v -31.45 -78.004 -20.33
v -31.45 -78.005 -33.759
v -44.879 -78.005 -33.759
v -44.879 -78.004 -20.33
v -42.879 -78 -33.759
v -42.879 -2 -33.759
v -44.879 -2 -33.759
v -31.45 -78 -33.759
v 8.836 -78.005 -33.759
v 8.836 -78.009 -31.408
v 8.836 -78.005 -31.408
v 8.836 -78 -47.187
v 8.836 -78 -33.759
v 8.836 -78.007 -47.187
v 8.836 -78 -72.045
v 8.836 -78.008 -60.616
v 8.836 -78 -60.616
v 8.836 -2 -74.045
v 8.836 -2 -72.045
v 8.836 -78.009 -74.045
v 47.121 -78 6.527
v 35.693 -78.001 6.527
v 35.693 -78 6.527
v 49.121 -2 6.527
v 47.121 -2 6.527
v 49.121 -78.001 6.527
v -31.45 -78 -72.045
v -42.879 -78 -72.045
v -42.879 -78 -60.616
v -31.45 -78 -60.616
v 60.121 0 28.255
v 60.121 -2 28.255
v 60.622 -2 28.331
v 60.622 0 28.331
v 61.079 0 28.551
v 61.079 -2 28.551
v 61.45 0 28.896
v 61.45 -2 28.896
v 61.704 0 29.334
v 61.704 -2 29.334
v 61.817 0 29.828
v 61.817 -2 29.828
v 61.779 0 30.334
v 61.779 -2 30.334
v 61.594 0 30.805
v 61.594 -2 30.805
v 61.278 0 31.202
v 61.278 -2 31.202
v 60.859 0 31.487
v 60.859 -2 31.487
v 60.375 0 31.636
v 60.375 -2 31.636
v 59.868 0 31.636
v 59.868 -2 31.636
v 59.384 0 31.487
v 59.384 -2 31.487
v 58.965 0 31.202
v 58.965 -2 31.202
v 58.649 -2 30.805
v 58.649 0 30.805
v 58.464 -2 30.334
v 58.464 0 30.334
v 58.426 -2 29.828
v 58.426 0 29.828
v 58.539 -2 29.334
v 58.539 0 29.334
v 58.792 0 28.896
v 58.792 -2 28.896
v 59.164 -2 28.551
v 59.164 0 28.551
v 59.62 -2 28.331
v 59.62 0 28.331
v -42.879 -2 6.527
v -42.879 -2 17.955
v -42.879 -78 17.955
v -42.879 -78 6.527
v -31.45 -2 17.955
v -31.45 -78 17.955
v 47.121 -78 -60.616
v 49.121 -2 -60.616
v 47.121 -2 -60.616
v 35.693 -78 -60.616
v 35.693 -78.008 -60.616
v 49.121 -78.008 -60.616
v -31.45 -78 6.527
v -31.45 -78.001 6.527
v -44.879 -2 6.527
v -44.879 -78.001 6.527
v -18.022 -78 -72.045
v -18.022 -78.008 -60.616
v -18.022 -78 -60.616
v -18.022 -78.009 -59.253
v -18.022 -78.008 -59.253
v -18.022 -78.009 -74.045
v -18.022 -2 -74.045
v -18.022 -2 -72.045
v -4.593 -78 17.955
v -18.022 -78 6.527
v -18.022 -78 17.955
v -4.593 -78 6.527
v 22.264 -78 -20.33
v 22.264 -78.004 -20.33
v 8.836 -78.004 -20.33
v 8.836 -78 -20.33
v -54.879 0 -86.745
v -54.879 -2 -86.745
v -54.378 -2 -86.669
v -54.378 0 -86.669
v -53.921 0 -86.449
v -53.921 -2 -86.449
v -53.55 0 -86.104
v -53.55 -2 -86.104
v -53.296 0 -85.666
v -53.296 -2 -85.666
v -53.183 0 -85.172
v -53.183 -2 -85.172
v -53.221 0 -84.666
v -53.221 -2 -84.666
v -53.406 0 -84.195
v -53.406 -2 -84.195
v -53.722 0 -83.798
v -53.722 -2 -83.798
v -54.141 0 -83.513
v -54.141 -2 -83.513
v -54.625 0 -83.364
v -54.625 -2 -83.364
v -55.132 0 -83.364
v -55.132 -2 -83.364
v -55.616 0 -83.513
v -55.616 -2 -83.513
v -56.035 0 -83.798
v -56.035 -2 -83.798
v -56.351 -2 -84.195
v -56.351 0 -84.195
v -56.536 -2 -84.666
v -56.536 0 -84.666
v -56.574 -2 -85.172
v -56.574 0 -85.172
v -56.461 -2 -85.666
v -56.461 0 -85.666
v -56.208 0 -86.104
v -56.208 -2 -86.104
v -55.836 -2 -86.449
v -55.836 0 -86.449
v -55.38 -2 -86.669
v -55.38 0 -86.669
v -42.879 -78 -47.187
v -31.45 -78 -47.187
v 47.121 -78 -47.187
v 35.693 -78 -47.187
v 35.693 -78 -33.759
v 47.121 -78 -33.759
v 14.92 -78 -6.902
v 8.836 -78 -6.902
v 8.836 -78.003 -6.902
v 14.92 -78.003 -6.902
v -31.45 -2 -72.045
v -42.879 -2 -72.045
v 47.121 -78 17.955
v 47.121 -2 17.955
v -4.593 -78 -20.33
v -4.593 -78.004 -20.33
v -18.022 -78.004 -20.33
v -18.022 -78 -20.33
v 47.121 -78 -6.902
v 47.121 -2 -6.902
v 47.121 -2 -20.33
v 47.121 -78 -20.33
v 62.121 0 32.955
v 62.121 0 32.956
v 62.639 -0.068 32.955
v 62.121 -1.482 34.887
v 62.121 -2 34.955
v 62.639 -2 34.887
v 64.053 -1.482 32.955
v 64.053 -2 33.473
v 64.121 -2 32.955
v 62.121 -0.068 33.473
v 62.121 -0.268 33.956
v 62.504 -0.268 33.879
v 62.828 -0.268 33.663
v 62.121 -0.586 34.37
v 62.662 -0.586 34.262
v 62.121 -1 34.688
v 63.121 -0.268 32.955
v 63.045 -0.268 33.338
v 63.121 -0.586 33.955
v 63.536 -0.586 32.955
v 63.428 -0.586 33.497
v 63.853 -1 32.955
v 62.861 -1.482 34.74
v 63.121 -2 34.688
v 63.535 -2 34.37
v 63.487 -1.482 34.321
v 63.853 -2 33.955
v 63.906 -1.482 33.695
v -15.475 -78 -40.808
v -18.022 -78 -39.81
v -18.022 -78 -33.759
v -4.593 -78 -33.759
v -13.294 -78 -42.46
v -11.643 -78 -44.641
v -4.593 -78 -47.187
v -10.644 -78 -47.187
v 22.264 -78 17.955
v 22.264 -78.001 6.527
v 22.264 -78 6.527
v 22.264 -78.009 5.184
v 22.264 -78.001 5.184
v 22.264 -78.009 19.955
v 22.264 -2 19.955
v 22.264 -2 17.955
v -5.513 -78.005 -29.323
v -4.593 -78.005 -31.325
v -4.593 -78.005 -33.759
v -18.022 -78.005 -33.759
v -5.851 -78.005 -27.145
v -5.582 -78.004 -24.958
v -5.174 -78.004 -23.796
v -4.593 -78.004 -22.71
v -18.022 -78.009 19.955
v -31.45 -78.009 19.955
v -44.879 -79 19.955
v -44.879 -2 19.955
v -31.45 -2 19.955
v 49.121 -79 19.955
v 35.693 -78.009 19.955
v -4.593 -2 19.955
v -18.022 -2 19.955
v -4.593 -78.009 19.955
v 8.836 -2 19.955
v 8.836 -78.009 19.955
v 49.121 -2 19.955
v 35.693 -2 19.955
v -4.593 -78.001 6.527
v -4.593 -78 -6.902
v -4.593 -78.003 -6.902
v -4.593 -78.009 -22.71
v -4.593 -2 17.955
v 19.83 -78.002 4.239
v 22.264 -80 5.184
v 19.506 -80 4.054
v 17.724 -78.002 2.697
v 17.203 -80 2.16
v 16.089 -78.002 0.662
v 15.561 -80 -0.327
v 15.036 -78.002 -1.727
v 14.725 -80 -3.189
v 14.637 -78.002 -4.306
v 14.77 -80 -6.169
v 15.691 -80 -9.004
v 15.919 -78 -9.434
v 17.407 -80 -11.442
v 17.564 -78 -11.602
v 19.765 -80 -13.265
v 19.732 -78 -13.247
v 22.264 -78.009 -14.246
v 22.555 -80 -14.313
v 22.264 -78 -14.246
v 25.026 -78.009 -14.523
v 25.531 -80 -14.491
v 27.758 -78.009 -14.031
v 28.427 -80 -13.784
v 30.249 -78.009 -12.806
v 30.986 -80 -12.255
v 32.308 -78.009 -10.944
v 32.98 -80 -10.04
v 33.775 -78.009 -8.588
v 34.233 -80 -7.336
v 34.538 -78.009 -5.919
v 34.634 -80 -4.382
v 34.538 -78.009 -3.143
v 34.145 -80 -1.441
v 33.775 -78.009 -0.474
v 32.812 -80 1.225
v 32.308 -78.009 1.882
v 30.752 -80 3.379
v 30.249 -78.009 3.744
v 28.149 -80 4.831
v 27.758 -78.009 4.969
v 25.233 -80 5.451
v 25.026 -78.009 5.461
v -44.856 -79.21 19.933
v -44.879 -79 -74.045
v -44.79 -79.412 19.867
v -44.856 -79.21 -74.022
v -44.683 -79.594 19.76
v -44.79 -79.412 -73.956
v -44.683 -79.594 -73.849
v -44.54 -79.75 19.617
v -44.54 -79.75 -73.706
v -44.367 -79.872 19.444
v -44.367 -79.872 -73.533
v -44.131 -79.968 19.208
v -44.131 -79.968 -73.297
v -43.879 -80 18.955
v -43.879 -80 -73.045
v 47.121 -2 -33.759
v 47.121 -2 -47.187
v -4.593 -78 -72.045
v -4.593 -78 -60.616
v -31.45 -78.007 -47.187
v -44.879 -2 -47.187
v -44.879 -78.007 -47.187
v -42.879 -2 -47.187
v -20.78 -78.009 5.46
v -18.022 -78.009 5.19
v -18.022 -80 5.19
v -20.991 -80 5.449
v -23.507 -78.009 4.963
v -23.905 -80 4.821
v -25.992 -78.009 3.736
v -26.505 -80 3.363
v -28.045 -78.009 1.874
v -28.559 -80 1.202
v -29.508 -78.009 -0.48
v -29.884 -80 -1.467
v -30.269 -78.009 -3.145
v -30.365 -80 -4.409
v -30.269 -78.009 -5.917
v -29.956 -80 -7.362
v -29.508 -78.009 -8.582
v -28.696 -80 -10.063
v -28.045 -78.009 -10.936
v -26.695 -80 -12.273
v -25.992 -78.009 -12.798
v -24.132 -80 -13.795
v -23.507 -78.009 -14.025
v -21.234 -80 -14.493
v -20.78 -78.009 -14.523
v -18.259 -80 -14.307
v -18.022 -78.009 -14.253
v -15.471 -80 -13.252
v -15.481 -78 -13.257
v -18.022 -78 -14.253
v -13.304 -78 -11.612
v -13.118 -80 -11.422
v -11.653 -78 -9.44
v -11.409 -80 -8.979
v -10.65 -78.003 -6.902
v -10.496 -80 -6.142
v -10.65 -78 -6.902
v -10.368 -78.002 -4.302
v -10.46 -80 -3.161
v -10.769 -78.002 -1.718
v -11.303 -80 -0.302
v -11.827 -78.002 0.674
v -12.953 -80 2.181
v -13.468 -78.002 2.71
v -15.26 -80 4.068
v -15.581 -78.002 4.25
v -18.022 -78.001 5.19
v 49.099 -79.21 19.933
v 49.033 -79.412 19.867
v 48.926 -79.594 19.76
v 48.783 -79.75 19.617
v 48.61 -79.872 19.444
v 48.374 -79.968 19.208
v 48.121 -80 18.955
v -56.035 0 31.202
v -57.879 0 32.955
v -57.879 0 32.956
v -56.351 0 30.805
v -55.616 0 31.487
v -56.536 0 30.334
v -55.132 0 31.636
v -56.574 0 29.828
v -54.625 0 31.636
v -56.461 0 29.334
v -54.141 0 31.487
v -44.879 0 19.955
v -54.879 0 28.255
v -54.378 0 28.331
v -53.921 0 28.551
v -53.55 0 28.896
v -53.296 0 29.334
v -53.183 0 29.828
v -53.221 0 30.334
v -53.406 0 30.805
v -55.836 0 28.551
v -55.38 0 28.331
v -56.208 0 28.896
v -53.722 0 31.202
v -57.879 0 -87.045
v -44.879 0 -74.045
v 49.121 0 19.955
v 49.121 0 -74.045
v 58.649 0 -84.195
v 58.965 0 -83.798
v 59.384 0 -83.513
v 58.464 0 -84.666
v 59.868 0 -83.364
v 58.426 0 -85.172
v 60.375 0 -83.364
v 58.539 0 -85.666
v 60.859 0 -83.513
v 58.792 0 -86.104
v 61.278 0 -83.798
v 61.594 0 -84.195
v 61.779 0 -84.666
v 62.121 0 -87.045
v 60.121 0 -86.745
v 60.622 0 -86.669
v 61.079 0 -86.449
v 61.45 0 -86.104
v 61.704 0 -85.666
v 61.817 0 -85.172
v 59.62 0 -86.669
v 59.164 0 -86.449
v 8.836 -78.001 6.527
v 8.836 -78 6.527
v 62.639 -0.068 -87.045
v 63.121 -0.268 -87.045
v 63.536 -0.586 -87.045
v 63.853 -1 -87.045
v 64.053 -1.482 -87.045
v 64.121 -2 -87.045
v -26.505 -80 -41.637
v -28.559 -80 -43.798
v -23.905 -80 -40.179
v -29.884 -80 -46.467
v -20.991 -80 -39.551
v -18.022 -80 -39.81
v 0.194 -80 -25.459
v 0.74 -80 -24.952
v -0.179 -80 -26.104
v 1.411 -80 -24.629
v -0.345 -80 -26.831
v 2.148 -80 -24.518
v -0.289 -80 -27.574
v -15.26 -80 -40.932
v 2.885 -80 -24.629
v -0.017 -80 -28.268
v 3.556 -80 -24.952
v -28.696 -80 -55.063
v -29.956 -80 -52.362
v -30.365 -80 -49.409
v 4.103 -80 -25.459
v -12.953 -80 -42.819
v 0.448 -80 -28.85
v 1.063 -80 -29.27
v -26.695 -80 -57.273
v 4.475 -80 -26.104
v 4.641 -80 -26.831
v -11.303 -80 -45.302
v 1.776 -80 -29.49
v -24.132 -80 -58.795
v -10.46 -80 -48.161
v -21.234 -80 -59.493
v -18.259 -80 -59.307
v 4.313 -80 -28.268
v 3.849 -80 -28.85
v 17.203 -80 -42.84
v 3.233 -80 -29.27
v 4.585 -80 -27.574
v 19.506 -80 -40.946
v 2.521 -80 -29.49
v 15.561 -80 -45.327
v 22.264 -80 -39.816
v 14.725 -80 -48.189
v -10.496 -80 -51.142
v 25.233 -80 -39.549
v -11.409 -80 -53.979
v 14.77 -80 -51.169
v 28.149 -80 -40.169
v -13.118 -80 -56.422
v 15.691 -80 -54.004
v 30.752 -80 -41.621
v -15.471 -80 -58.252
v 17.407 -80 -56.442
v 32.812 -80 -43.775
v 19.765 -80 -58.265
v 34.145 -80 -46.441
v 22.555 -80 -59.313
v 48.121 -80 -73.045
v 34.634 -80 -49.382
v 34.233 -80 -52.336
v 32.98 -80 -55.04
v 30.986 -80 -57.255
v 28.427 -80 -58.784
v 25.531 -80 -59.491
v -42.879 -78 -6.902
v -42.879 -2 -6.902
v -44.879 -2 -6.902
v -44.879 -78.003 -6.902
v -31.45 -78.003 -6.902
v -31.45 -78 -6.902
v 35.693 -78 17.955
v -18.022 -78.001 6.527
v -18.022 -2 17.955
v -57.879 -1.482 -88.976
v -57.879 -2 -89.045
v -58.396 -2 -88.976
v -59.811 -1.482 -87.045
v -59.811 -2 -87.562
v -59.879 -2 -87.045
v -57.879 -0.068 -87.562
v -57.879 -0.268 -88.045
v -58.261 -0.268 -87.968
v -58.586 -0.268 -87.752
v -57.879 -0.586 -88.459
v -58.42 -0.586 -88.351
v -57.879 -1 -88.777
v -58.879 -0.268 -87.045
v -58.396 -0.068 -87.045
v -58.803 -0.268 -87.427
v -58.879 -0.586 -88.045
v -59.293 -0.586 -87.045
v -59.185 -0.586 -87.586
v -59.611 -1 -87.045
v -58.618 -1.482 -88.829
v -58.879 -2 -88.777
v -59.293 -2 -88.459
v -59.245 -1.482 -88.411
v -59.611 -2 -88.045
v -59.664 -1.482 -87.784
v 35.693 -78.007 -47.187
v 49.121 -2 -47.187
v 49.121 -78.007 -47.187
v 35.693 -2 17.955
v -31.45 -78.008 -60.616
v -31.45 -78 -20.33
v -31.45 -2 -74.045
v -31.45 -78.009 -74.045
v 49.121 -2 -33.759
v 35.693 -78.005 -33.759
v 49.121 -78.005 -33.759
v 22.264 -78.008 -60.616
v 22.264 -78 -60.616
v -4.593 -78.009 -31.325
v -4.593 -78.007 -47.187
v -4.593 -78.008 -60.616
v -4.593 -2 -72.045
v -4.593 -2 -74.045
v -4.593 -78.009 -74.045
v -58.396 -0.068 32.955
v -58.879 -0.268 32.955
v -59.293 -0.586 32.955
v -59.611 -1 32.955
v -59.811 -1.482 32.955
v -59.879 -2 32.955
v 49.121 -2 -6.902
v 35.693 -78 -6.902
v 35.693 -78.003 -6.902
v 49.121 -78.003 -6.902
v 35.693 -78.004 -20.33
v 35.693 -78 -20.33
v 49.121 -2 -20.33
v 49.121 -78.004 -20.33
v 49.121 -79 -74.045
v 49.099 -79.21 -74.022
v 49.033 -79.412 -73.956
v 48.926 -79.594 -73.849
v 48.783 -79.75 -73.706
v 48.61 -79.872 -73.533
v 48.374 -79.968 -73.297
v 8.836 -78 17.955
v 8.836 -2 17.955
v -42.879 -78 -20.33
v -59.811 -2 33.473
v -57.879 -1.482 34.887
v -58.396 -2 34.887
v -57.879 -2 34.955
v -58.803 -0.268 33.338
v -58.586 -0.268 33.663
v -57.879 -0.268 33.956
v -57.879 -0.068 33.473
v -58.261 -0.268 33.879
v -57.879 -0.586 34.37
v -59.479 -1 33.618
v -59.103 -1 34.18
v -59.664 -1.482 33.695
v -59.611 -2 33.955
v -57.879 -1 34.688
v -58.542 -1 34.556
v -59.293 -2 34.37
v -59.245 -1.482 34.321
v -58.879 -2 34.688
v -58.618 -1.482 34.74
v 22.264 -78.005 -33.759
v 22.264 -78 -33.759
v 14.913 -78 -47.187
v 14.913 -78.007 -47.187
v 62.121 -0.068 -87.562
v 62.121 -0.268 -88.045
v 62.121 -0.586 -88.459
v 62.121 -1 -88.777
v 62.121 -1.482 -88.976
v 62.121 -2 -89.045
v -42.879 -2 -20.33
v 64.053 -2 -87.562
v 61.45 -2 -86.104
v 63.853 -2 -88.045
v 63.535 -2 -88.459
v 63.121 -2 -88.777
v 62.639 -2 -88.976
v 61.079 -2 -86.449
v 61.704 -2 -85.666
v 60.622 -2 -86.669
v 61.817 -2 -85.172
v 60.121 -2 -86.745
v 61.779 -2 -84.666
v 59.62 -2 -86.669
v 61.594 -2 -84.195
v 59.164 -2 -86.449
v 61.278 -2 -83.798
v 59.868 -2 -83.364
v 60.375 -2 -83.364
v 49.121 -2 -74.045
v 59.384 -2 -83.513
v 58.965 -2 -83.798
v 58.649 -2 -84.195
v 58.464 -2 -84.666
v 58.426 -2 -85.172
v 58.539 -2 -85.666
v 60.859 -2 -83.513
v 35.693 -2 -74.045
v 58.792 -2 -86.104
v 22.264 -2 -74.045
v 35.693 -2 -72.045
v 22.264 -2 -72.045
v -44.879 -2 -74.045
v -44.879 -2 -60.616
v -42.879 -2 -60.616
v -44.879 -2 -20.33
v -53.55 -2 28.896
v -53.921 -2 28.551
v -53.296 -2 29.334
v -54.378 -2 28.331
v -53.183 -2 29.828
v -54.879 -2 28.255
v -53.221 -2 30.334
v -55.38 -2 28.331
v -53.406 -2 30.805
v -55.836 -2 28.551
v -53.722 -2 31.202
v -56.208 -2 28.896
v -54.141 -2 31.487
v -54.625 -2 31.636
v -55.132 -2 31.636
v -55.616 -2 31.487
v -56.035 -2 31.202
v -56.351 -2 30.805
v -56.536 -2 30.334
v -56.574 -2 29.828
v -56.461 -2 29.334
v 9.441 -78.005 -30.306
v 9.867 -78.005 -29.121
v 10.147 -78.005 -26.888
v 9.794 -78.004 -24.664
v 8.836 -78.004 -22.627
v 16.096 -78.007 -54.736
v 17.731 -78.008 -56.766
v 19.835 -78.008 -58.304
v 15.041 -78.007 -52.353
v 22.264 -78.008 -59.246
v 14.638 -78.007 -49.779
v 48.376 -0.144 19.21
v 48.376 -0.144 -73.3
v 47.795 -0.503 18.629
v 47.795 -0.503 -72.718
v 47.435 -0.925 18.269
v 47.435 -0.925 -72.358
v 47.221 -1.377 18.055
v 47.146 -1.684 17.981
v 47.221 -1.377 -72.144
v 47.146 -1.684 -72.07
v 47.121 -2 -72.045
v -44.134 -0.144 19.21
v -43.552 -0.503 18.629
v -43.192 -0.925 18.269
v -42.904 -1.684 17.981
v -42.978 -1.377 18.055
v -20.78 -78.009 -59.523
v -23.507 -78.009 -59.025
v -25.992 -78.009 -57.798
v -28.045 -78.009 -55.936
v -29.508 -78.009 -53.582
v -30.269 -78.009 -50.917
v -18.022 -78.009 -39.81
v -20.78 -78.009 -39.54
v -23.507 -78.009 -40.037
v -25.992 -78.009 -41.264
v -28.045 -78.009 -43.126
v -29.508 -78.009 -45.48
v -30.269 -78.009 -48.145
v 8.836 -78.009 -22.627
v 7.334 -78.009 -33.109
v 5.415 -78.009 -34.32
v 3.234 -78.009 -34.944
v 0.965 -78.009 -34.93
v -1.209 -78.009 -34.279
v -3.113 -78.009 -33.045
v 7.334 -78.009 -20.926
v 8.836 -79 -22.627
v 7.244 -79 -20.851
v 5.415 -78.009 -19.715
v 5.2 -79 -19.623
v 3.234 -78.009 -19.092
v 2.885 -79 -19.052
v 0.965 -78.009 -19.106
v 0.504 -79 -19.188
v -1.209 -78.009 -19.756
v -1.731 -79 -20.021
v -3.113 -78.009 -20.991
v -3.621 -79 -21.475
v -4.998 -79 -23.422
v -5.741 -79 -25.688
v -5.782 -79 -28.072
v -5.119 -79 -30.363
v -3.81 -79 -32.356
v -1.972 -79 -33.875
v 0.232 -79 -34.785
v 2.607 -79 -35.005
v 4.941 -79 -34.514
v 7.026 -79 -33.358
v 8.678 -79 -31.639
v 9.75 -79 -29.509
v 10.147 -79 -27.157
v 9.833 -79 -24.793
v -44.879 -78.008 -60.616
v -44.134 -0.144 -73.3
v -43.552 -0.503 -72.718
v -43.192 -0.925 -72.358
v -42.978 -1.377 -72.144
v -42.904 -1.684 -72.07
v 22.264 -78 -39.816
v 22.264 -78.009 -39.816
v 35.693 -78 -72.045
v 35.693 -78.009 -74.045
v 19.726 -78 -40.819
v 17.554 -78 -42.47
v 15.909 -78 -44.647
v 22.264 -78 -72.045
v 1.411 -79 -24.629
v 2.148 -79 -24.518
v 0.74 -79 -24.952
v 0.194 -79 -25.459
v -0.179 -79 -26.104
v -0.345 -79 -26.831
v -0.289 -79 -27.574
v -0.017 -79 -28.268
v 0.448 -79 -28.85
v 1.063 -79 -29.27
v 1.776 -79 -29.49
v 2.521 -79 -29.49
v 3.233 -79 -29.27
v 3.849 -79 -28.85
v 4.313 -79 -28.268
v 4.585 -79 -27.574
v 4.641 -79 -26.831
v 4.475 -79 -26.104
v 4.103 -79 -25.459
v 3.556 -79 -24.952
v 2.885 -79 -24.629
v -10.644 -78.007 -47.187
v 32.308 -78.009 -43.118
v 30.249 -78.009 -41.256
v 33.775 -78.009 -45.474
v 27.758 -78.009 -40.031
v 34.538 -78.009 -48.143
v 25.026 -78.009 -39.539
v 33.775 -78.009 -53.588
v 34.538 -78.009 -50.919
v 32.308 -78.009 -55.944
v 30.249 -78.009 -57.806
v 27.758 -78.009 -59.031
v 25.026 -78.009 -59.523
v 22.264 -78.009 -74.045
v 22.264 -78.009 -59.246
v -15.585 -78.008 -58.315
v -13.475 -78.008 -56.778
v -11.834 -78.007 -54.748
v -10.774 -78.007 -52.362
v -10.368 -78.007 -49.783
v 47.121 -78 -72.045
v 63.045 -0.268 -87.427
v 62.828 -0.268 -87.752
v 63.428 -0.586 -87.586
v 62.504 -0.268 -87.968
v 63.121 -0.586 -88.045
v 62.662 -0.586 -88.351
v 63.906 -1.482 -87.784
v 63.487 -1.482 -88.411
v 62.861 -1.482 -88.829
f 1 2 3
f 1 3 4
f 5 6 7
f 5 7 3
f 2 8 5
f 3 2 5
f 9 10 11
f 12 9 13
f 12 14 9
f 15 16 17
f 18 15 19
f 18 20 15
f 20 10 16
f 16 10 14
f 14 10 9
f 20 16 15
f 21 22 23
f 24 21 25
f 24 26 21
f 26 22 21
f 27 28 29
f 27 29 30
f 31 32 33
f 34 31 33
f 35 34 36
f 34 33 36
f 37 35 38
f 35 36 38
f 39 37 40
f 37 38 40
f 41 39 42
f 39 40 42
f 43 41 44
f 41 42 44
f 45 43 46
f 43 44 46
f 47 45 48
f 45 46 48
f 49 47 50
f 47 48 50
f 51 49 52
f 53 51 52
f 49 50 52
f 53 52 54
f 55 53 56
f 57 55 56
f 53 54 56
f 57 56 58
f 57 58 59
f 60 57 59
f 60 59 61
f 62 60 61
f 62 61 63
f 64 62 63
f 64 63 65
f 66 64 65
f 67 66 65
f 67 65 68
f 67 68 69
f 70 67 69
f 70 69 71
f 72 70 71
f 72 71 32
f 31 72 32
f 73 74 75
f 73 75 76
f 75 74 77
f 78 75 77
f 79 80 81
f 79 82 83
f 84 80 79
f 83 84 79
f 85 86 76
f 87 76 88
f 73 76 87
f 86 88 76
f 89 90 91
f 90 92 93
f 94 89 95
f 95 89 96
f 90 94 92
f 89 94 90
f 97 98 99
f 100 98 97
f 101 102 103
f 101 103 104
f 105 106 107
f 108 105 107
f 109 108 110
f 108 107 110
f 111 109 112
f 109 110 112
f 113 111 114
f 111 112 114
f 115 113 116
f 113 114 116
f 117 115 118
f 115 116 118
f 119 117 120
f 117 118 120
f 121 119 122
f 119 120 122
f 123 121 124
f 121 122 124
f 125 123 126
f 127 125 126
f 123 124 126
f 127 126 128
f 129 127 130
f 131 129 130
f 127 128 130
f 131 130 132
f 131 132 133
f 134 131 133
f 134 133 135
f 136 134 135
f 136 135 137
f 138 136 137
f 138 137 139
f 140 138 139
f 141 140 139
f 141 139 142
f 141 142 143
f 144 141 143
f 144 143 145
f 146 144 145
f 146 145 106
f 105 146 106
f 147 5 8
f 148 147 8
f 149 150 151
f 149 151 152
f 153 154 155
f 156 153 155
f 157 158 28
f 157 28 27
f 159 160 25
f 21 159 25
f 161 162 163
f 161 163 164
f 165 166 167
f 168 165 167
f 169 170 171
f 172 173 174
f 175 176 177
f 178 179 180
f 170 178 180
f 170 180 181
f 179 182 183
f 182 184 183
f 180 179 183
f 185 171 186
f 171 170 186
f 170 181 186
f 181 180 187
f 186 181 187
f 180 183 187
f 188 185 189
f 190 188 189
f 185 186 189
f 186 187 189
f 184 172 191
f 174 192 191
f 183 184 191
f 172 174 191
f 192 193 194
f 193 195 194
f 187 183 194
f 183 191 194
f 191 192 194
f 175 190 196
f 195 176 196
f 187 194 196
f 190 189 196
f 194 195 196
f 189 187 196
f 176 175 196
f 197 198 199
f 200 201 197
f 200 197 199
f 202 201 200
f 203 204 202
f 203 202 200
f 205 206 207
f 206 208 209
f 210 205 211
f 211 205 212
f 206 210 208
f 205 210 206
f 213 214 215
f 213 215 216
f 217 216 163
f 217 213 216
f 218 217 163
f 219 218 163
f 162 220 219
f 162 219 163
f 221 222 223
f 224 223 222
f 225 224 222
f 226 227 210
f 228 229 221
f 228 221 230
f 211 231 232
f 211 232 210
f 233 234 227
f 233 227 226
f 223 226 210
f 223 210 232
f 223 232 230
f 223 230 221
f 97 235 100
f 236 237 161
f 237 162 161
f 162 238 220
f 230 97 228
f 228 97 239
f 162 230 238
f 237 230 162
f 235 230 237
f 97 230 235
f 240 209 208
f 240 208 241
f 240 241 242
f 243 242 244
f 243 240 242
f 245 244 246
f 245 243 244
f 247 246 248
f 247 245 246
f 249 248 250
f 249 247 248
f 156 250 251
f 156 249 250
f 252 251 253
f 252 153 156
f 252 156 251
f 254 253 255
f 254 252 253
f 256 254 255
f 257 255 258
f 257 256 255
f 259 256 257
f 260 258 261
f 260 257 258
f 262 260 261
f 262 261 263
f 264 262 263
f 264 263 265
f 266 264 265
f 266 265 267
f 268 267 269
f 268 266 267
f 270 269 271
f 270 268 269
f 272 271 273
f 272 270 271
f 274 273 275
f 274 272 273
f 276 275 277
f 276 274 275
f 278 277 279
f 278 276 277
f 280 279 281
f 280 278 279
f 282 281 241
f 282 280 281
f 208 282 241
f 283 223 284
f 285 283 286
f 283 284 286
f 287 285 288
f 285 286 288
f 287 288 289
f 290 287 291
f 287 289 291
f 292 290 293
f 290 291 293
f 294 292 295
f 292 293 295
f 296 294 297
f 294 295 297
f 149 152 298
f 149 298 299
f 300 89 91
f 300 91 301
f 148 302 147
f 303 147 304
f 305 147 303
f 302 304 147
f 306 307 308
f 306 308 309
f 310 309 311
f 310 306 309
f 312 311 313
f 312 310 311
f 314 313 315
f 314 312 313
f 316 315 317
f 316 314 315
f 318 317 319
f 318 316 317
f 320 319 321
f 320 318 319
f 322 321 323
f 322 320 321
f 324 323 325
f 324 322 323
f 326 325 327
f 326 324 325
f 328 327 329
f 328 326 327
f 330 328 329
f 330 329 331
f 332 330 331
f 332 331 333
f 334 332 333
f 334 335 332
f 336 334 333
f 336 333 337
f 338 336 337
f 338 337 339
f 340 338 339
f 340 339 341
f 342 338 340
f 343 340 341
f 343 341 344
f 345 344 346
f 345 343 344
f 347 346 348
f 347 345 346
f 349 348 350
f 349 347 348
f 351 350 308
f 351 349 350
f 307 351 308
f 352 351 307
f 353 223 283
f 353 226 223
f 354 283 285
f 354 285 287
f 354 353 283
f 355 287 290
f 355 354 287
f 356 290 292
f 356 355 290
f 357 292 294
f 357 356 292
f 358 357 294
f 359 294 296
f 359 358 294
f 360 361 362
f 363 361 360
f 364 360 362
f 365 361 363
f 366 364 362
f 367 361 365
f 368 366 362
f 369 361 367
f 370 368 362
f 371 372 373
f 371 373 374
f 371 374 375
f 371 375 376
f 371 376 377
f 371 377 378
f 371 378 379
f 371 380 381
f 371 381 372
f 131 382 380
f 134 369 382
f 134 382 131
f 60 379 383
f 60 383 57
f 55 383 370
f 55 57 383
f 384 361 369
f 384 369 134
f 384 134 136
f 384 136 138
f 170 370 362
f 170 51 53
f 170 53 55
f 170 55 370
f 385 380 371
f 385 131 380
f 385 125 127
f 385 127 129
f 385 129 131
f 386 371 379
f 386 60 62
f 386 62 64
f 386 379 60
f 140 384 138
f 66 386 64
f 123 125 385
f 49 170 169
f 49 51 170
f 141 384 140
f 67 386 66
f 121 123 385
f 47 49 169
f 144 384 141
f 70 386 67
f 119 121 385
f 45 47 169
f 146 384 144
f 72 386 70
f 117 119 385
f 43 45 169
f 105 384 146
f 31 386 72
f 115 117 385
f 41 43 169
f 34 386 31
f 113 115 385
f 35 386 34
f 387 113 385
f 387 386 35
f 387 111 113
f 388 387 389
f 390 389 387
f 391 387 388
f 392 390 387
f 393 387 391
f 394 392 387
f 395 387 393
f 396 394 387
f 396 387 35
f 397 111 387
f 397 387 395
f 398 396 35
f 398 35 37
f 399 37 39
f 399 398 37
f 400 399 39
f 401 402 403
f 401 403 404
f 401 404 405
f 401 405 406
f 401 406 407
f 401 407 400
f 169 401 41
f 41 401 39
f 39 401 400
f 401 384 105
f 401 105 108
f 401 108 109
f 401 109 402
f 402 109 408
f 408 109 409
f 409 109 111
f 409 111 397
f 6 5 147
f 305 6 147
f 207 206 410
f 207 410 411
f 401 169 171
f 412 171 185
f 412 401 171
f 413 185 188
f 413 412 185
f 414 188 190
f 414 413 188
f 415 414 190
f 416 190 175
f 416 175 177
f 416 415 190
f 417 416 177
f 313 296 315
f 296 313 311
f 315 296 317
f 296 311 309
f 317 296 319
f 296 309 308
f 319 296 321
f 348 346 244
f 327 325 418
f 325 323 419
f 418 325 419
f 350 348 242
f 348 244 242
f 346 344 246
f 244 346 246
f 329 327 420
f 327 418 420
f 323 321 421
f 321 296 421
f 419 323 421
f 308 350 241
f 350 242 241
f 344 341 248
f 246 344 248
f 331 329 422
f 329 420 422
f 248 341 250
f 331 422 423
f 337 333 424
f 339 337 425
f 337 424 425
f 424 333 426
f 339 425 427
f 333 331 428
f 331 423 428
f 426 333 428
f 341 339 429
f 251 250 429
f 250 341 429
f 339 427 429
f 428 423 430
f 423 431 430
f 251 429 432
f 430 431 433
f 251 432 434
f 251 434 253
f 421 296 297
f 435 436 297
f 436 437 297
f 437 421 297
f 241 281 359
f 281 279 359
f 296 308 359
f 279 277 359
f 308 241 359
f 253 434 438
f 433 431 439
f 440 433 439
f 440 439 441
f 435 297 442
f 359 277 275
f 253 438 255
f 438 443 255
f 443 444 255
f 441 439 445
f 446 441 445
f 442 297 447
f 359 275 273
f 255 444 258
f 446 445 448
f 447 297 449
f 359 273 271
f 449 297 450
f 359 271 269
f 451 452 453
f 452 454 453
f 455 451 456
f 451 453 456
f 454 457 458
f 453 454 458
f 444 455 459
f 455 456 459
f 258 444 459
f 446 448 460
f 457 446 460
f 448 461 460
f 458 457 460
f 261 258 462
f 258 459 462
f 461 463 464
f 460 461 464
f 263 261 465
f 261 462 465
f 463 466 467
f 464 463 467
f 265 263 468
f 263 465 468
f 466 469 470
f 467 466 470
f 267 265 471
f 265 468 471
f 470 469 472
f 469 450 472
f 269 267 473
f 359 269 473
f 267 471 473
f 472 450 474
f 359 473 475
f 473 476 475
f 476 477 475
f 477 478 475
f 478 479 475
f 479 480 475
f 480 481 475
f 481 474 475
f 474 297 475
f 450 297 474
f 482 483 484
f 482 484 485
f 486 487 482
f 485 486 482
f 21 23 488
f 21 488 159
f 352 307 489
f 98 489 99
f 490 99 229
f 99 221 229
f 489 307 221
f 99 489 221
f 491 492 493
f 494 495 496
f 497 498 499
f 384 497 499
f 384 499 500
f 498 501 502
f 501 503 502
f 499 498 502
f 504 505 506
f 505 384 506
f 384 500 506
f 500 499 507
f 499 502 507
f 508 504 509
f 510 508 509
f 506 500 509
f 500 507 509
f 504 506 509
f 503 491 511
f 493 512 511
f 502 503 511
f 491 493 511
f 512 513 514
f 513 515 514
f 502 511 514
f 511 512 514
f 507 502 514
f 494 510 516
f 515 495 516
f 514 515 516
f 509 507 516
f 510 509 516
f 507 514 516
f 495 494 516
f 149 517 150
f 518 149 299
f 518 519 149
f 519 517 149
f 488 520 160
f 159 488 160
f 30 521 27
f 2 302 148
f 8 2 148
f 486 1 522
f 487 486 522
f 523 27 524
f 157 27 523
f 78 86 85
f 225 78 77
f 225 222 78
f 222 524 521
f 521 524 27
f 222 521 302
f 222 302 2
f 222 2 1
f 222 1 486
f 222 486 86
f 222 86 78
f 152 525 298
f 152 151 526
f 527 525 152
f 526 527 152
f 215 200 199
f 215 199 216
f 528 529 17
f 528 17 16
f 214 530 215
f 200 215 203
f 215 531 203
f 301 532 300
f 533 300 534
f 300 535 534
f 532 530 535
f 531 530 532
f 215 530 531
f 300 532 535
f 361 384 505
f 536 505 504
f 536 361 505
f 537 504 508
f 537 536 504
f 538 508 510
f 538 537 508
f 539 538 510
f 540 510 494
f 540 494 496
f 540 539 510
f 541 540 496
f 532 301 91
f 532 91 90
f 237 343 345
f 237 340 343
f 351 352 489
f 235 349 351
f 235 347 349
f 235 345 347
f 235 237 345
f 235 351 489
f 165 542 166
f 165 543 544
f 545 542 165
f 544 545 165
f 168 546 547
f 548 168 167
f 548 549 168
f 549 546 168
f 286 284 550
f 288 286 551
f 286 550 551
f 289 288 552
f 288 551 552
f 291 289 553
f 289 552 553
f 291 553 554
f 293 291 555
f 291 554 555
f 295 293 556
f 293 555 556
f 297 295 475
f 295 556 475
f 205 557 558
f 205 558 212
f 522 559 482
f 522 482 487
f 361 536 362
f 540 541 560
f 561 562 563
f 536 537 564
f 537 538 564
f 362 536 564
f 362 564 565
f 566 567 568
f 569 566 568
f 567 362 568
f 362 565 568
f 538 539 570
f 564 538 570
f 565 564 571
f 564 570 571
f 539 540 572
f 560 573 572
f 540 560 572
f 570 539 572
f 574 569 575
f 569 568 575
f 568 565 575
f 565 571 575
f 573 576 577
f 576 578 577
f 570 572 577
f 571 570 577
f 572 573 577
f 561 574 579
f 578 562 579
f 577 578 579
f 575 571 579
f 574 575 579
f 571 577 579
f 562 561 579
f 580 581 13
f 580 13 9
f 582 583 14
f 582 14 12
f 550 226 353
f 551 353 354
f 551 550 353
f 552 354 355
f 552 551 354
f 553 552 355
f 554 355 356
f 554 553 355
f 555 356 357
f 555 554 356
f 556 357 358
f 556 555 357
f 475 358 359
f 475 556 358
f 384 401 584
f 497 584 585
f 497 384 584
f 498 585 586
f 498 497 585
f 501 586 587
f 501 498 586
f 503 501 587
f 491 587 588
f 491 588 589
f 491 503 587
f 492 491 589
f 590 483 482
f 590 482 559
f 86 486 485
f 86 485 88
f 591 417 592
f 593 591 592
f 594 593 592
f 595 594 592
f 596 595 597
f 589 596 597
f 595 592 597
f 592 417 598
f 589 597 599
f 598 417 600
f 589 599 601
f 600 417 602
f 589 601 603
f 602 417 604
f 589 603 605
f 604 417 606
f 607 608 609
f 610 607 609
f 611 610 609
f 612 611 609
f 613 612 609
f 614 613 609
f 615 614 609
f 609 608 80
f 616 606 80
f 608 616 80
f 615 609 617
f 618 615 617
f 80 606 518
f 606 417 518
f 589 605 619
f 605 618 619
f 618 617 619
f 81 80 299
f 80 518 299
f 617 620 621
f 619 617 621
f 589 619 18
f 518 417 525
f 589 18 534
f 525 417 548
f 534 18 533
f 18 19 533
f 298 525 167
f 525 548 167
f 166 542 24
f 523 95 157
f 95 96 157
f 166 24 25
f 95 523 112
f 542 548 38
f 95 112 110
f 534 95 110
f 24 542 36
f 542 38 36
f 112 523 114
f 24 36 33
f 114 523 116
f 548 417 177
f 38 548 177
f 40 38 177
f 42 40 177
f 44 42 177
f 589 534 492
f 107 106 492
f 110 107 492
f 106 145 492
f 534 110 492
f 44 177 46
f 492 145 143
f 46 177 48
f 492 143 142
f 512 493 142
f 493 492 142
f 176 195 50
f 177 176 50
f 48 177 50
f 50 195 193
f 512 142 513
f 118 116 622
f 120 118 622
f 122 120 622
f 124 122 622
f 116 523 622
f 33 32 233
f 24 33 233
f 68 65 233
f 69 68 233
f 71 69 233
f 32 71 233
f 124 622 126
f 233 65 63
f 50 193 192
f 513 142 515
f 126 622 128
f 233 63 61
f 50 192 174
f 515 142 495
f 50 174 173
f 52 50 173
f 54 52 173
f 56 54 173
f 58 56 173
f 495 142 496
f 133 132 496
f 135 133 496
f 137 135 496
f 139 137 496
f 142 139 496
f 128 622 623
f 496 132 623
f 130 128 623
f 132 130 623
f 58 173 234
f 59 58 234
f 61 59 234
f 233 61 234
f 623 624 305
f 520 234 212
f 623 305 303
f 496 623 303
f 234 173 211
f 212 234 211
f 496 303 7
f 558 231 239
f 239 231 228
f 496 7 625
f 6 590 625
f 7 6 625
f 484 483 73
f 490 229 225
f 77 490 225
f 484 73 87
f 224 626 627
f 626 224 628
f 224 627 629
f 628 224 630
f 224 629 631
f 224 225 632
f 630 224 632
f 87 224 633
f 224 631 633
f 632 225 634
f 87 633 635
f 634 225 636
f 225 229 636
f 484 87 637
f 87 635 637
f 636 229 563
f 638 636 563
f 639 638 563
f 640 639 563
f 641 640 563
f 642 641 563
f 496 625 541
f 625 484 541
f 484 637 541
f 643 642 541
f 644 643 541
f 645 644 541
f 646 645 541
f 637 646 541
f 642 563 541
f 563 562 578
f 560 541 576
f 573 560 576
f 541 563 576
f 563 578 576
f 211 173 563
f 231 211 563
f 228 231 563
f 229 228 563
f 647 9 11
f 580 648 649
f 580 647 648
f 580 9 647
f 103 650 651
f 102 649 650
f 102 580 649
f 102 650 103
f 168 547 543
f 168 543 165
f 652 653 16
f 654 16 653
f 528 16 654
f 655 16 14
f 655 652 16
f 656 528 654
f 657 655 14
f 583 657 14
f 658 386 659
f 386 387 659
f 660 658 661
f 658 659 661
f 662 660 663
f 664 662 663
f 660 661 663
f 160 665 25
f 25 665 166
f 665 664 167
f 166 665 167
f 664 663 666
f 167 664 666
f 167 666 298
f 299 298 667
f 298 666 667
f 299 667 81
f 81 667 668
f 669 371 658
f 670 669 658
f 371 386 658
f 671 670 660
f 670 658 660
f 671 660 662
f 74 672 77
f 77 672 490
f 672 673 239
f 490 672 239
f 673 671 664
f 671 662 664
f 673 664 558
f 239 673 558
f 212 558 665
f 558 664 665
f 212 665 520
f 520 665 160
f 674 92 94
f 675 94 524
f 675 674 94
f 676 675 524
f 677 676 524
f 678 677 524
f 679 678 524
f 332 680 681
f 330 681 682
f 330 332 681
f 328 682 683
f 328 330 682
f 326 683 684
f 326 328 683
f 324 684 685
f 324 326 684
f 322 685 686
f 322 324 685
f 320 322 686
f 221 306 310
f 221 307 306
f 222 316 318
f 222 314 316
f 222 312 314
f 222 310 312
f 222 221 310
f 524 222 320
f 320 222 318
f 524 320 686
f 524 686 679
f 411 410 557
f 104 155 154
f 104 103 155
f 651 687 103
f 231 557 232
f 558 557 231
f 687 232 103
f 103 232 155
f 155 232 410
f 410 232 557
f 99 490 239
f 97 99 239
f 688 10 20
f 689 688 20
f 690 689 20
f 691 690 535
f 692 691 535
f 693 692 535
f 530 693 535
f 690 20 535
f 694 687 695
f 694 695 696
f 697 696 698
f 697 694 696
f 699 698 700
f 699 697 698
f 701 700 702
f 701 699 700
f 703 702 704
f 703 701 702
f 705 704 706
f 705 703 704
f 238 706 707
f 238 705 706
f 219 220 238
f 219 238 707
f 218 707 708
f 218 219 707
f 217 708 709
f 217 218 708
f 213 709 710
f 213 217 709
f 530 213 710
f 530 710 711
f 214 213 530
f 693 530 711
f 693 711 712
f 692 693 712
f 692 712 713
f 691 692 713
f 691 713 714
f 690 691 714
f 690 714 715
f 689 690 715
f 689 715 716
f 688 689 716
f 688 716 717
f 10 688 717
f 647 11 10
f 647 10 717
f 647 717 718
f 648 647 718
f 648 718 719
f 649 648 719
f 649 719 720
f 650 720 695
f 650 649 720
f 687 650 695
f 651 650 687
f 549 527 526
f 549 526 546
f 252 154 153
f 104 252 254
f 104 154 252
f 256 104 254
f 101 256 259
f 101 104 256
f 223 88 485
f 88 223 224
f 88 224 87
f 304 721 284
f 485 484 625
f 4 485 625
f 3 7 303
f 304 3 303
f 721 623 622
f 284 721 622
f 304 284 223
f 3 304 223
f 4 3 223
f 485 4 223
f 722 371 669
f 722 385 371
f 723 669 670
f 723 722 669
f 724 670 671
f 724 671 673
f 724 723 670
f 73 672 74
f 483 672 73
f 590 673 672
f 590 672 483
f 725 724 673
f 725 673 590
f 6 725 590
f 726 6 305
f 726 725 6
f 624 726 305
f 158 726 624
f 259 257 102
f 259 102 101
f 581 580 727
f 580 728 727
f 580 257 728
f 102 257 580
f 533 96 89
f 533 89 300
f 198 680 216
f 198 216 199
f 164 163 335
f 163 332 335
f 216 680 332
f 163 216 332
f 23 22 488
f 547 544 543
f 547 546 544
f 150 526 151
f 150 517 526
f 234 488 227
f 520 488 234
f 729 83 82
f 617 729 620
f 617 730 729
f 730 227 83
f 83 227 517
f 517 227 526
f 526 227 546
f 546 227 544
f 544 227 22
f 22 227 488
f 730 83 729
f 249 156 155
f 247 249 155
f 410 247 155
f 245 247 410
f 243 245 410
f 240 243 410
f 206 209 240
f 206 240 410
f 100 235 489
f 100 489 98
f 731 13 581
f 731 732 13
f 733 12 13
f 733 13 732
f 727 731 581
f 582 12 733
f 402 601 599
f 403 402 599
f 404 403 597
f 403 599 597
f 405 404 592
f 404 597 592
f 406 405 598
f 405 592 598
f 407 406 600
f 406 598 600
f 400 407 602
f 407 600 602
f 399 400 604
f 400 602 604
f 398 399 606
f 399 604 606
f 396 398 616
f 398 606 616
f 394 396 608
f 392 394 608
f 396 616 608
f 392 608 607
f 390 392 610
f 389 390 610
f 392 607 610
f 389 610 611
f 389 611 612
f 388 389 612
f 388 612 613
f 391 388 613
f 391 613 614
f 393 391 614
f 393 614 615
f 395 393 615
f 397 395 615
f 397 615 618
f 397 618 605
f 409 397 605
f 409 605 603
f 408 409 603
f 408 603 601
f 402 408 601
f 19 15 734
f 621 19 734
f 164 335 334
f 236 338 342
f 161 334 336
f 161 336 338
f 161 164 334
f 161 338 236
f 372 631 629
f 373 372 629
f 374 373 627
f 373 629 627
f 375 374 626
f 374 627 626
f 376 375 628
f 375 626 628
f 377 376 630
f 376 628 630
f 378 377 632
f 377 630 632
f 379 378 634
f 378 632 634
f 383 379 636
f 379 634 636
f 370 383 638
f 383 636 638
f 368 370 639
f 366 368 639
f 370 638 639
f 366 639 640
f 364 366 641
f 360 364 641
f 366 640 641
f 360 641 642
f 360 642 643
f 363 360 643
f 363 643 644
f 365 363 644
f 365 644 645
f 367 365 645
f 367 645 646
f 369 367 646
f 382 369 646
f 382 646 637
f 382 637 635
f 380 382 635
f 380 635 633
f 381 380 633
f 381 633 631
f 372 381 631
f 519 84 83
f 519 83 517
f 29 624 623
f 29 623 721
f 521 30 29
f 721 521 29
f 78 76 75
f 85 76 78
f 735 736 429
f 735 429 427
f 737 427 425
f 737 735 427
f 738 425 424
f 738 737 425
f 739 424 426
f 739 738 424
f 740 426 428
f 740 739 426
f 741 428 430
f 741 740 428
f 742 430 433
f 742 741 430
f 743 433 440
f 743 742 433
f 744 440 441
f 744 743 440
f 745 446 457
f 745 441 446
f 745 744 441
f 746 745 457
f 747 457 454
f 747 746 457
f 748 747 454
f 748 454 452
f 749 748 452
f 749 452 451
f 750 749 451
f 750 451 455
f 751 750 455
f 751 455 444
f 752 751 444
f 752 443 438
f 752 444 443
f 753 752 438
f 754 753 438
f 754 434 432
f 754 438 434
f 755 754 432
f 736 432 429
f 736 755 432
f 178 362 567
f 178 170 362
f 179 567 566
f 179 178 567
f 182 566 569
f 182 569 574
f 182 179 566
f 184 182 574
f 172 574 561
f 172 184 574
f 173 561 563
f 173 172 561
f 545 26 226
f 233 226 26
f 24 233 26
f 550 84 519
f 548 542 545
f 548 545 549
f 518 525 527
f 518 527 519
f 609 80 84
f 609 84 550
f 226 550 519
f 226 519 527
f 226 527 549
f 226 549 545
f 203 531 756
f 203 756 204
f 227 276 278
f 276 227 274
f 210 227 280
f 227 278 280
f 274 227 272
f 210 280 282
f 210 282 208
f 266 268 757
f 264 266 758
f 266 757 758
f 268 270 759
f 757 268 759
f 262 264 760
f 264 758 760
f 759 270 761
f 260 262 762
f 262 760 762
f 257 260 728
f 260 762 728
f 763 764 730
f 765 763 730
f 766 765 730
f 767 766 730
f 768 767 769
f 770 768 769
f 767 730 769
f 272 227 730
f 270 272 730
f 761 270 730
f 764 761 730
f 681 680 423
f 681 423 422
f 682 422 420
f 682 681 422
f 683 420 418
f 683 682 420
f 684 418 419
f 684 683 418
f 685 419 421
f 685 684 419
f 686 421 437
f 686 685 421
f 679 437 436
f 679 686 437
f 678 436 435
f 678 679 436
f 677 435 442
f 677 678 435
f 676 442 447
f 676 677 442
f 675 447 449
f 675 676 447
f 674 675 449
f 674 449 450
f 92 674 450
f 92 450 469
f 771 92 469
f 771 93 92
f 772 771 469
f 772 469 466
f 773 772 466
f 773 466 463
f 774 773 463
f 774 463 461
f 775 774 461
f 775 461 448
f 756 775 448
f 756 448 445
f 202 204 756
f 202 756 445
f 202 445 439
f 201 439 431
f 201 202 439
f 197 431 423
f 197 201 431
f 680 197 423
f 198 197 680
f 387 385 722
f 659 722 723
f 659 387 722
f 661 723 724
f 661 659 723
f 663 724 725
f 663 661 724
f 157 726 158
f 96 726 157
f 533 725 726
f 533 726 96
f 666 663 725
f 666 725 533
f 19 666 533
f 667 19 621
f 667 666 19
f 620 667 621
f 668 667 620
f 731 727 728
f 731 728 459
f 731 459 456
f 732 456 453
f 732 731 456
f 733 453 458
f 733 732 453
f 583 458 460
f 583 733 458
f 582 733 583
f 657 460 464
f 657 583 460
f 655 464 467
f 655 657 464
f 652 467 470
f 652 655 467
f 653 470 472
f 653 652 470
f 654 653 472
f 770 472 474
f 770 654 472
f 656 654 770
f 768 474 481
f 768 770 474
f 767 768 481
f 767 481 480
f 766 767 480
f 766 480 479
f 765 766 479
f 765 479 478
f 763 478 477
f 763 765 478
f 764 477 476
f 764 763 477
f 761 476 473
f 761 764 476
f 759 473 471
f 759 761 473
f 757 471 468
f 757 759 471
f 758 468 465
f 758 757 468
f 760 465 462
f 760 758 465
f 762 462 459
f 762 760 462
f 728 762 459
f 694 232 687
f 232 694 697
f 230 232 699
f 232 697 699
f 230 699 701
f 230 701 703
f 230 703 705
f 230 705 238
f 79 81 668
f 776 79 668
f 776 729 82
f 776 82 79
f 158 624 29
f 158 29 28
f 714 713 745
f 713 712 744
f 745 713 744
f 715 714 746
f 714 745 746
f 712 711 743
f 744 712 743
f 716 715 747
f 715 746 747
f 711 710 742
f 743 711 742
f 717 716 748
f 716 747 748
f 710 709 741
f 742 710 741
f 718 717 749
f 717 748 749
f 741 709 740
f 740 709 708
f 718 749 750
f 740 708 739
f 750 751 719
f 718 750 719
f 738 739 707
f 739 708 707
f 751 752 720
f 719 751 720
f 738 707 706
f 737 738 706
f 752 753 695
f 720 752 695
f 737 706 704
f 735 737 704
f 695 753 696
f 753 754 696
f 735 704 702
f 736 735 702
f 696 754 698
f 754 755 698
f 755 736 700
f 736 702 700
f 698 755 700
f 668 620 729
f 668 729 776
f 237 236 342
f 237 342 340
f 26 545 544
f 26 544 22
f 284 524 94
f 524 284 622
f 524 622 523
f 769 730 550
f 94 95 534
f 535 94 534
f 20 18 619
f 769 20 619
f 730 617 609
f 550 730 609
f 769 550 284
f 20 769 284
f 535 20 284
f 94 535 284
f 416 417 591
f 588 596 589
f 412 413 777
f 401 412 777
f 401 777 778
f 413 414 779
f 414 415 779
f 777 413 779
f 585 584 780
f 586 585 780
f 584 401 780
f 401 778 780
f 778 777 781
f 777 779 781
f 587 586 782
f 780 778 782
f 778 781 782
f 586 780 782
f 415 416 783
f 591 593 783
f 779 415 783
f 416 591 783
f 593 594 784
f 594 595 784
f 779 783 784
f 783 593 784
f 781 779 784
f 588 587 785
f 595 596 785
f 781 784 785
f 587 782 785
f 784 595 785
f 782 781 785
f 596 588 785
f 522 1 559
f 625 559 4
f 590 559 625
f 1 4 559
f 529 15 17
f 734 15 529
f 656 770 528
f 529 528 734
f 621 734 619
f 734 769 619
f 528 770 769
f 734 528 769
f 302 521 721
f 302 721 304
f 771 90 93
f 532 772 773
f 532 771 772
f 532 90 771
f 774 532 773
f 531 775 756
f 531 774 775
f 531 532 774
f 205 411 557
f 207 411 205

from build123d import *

# Parameters (mm, degrees)
SKETCH_1_W               = 94
SKETCH_1_H               = 94
EXTRUDE_1_DEPTH          = 80
SKETCH_1_3_W             = 90
SKETCH_1_3_H             = 90
CUT_EXTRUDE_1_DEPTH      = 78
SKETCH_1_5_W             = 124
SKETCH_1_5_H             = 124
SKETCH_1_5_W_2           = 94
SKETCH_1_5_H_2           = 94
EXTRUDE_2_DEPTH          = 2
FILLET_1_R               = 2
CUT_EXTRUDE_4_DEPTH      = 162.89480683
CUT_EXTRUDE_5_DEPTH      = 162.89480683
CUT_EXTRUDE_6_DEPTH      = 162.89480683
SKETCH_6_W               = 13.428571429
SKETCH_6_H               = 76.0093606
CUT_EXTRUDE_7_DEPTH      = 150.641361191
SKETCH_6_3_W             = 13.428571429
SKETCH_6_3_H             = 76.0093606
CUT_EXTRUDE_8_DEPTH      = 150.641361191
CUT_EXTRUDE_9_DEPTH      = 150.641361191
CUT_EXTRUDE_9_DEPTH_BACK = 150.641361191
SKETCH_6_4_W             = 13.428571428
SKETCH_6_4_H             = 76.0093606
SKETCH_8_R               = 2.5
CUT_EXTRUDE_13_DEPTH     = 135.627134923
SKETCH_8_4_R             = 8
CUT_EXTRUDE_16_DEPTH     = 1
SKETCH_8_5_R             = 10
CUT_EXTRUDE_17_DEPTH     = 135.627134923
FILLET_2_R               = 2
FILLET_4_R               = 2
FILLET_10_R              = 1
SKETCH_10_R              = 1.7
CUT_EXTRUDE_18_DEPTH     = 10


with BuildPart() as part:
    # 草图1 → 凸台-拉伸1 (new body)
    with BuildSketch(Plane(origin=(0, 0, 0), x_dir=(1, 0, 0), z_dir=(0, 1, 0))):
        with Locations((2.121267759, 27.044530874)):
            Rectangle(SKETCH_1_W, SKETCH_1_H)
    extrude(amount=-EXTRUDE_1_DEPTH)

    # 草图1<3> → 切除-拉伸1 (cut)
    with BuildSketch(Plane(origin=(0, 0, 0), x_dir=(1, 0, 0), z_dir=(0, 1, 0))):
        with Locations((2.121267759, 27.044530874)):
            Rectangle(SKETCH_1_3_W, SKETCH_1_3_H)
    extrude(amount=-CUT_EXTRUDE_1_DEPTH, mode=Mode.SUBTRACT)

    # 草图1<5> → 凸台-拉伸2 (add)
    with BuildSketch(Plane(origin=(0, 0, 0), x_dir=(1, 0, 0), z_dir=(0, 1, 0))):
        with Locations((2.121267759, 27.044530874)):
            Rectangle(SKETCH_1_5_W, SKETCH_1_5_H)
        with Locations((2.121267759, 27.044530874)):
            Rectangle(SKETCH_1_5_W_2, SKETCH_1_5_H_2, mode=Mode.SUBTRACT)
    extrude(amount=-EXTRUDE_2_DEPTH)

    # 圆角1
    fillet_1_edges = [part.edges().sort_by_distance(p)[0] for p in [
        (2.121267759, 0, -72.044530874),
        (47.121267759, 0, -27.044530874),
        (-42.878732241, 0, -27.044530874),
        (2.121267759, 0, 17.955469126),
    ]]
    fillet(fillet_1_edges, radius=FILLET_1_R)

    # 草图5 → 切除-拉伸4 (cut, through all)
    with BuildSketch(Plane(origin=(49.121267759, 0, 0), x_dir=(0, 0, -1), z_dir=(1, 0, 0))):
        Polygon((-6.526897697, -78.001337229), (-6.526897697, -2), (6.901673731, -2), (6.901673731, -78.002674457), align=None)
    extrude(amount=-CUT_EXTRUDE_4_DEPTH, mode=Mode.SUBTRACT)

    # 草图5<5> → 切除-拉伸5 (cut, through all)
    with BuildSketch(Plane(origin=(49.121267759, 0, 0), x_dir=(0, 0, -1), z_dir=(1, 0, 0))):
        Polygon((20.33024516, -78.004011686), (20.33024516, -2), (33.758816589, -2), (33.758816589, -78.005348914), align=None)
    extrude(amount=-CUT_EXTRUDE_5_DEPTH, mode=Mode.SUBTRACT)

    # 草图5<6> → 切除-拉伸6 (cut, through all)
    with BuildSketch(Plane(origin=(49.121267759, 0, 0), x_dir=(0, 0, -1), z_dir=(1, 0, 0))):
        Polygon((47.187388017, -78.006686143), (47.187388017, -2), (60.615959446, -2), (60.615959446, -78.008023372), align=None)
    extrude(amount=-CUT_EXTRUDE_6_DEPTH, mode=Mode.SUBTRACT)

    # 草图6 → 切除-拉伸7 (cut, through all)
    with BuildSketch(Plane(origin=(0, 0, -74.044530874), x_dir=(-1, 0, 0), z_dir=(0, 0, -1))):
        with Locations((-28.978410616, -40.0046803)):
            Rectangle(SKETCH_6_W, SKETCH_6_H)
    extrude(amount=-CUT_EXTRUDE_7_DEPTH, mode=Mode.SUBTRACT)

    # 草图6<3> → 切除-拉伸8 (cut, through all)
    with BuildSketch(Plane(origin=(0, 0, -74.044530874), x_dir=(-1, 0, 0), z_dir=(0, 0, -1))):
        with Locations((-2.12126776, -40.0046803)):
            Rectangle(SKETCH_6_3_W, SKETCH_6_3_H)
    extrude(amount=-CUT_EXTRUDE_8_DEPTH, mode=Mode.SUBTRACT)

    # 草图6<4> → 切除-拉伸9 (cut, two sides: drawn at the far end of the back side and taken through both)
    with BuildSketch(Plane(origin=(0, 0, -74.044530874), x_dir=(-1, 0, 0), z_dir=(0, 0, -1)).offset(-CUT_EXTRUDE_9_DEPTH_BACK)):
        with Locations((24.735875098, -40.0046803)):
            Rectangle(SKETCH_6_4_W, SKETCH_6_4_H)
    extrude(amount=CUT_EXTRUDE_9_DEPTH + CUT_EXTRUDE_9_DEPTH_BACK, mode=Mode.SUBTRACT)

    # 草图8 → 切除-拉伸13 (cut, through all)
    with BuildSketch(Plane(origin=(0, -78, 0), x_dir=(-1, 0, 0), z_dir=(0, -1, 0))):
        with Locations(Location((-2.148108933, 27.017689701, 0), (0, 0, 270))):
            Circle(SKETCH_8_R)
    extrude(amount=CUT_EXTRUDE_13_DEPTH, mode=Mode.SUBTRACT)

    # 草图8<4> → 切除-拉伸16 (cut)
    with BuildSketch(Plane(origin=(0, -78, 0), x_dir=(-1, 0, 0), z_dir=(0, -1, 0))):
        with Locations(Location((-2.148108933, 27.017689701, 0), (0, 0, 213.287140052))):
            Circle(SKETCH_8_4_R)
    extrude(amount=CUT_EXTRUDE_16_DEPTH, mode=Mode.SUBTRACT)

    # 草图8<5> → 切除-拉伸17 (cut, through all)
    with BuildSketch(Plane(origin=(0, -78, 0), x_dir=(-1, 0, 0), z_dir=(0, -1, 0))):
        with Locations(Location((20.365311654, 4.531110288, 0), (0, 0, 256.445379393))):
            Circle(SKETCH_8_5_R)
        with Locations(Location((-24.634688346, 49.531110288, 0), (0, 0, 283.712868299))):
            Circle(SKETCH_8_5_R)
        with Locations(Location((-24.634688346, 4.531110288, 0), (0, 0, 283.712868299))):
            Circle(SKETCH_8_5_R)
        with Locations(Location((20.365311654, 49.531110288, 0), (0, 0, 256.445379393))):
            Circle(SKETCH_8_5_R)
    extrude(amount=CUT_EXTRUDE_17_DEPTH, mode=Mode.SUBTRACT)

    # 圆角2
    fillet_2_edges = [part.edges().sort_by_distance(p)[0] for p in [
        (-59.878732241, -1, 34.955469126),
        (-59.878732241, -1, -89.044530874),
        (64.121267759, -1, -89.044530874),
        (64.121267759, -1, 34.955469126),
    ]]
    fillet(fillet_2_edges, radius=FILLET_2_R)

    # 圆角4
    fillet_4_edges = [part.edges().sort_by_distance(p)[0] for p in [
        (2.121267759, 0, 34.955469126),
        (-59.878732241, 0, -27.044530874),
        (64.121267759, 0, -27.044530874),
        (2.121267759, 0, -89.044530874),
        (-59.292945803, 0, -88.458744437),
        (63.535481322, 0, -88.458744437),
        (-59.292945803, 0, 34.369682688),
        (63.535481322, 0, 34.369682688),
    ]]
    fillet(fillet_4_edges, radius=FILLET_4_R - 0.0001)  # a hair under: the kernel refuses the full size

    # 圆角10
    fillet_10_edges = [part.edges().sort_by_distance(p)[0] for p in [
        (2.121267759, -80, 19.955469126),
        (-44.878732241, -80, -27.044530874),
        (2.121267759, -80, -74.044530874),
        (49.121267759, -80, -27.044530874),
    ]]
    fillet(fillet_10_edges, radius=FILLET_10_R)

    # 草图10 → 切除-拉伸18 (cut)
    with BuildSketch(Plane.XZ.offset(7)):
        with Locations(Location((60.121267759, 29.955469126, 0), (0, 0, 270))):
            Circle(SKETCH_10_R)
        with Locations(Location((60.121267759, -85.044530874, 0), (0, 0, 270))):
            Circle(SKETCH_10_R)
        with Locations(Location((-54.878732241, -85.044530874, 0), (0, 0, 270))):
            Circle(SKETCH_10_R)
        with Locations(Location((-54.878732241, 29.955469126, 0), (0, 0, 270))):
            Circle(SKETCH_10_R)
    extrude(amount=-CUT_EXTRUDE_18_DEPTH, mode=Mode.SUBTRACT)


solid = part.part
